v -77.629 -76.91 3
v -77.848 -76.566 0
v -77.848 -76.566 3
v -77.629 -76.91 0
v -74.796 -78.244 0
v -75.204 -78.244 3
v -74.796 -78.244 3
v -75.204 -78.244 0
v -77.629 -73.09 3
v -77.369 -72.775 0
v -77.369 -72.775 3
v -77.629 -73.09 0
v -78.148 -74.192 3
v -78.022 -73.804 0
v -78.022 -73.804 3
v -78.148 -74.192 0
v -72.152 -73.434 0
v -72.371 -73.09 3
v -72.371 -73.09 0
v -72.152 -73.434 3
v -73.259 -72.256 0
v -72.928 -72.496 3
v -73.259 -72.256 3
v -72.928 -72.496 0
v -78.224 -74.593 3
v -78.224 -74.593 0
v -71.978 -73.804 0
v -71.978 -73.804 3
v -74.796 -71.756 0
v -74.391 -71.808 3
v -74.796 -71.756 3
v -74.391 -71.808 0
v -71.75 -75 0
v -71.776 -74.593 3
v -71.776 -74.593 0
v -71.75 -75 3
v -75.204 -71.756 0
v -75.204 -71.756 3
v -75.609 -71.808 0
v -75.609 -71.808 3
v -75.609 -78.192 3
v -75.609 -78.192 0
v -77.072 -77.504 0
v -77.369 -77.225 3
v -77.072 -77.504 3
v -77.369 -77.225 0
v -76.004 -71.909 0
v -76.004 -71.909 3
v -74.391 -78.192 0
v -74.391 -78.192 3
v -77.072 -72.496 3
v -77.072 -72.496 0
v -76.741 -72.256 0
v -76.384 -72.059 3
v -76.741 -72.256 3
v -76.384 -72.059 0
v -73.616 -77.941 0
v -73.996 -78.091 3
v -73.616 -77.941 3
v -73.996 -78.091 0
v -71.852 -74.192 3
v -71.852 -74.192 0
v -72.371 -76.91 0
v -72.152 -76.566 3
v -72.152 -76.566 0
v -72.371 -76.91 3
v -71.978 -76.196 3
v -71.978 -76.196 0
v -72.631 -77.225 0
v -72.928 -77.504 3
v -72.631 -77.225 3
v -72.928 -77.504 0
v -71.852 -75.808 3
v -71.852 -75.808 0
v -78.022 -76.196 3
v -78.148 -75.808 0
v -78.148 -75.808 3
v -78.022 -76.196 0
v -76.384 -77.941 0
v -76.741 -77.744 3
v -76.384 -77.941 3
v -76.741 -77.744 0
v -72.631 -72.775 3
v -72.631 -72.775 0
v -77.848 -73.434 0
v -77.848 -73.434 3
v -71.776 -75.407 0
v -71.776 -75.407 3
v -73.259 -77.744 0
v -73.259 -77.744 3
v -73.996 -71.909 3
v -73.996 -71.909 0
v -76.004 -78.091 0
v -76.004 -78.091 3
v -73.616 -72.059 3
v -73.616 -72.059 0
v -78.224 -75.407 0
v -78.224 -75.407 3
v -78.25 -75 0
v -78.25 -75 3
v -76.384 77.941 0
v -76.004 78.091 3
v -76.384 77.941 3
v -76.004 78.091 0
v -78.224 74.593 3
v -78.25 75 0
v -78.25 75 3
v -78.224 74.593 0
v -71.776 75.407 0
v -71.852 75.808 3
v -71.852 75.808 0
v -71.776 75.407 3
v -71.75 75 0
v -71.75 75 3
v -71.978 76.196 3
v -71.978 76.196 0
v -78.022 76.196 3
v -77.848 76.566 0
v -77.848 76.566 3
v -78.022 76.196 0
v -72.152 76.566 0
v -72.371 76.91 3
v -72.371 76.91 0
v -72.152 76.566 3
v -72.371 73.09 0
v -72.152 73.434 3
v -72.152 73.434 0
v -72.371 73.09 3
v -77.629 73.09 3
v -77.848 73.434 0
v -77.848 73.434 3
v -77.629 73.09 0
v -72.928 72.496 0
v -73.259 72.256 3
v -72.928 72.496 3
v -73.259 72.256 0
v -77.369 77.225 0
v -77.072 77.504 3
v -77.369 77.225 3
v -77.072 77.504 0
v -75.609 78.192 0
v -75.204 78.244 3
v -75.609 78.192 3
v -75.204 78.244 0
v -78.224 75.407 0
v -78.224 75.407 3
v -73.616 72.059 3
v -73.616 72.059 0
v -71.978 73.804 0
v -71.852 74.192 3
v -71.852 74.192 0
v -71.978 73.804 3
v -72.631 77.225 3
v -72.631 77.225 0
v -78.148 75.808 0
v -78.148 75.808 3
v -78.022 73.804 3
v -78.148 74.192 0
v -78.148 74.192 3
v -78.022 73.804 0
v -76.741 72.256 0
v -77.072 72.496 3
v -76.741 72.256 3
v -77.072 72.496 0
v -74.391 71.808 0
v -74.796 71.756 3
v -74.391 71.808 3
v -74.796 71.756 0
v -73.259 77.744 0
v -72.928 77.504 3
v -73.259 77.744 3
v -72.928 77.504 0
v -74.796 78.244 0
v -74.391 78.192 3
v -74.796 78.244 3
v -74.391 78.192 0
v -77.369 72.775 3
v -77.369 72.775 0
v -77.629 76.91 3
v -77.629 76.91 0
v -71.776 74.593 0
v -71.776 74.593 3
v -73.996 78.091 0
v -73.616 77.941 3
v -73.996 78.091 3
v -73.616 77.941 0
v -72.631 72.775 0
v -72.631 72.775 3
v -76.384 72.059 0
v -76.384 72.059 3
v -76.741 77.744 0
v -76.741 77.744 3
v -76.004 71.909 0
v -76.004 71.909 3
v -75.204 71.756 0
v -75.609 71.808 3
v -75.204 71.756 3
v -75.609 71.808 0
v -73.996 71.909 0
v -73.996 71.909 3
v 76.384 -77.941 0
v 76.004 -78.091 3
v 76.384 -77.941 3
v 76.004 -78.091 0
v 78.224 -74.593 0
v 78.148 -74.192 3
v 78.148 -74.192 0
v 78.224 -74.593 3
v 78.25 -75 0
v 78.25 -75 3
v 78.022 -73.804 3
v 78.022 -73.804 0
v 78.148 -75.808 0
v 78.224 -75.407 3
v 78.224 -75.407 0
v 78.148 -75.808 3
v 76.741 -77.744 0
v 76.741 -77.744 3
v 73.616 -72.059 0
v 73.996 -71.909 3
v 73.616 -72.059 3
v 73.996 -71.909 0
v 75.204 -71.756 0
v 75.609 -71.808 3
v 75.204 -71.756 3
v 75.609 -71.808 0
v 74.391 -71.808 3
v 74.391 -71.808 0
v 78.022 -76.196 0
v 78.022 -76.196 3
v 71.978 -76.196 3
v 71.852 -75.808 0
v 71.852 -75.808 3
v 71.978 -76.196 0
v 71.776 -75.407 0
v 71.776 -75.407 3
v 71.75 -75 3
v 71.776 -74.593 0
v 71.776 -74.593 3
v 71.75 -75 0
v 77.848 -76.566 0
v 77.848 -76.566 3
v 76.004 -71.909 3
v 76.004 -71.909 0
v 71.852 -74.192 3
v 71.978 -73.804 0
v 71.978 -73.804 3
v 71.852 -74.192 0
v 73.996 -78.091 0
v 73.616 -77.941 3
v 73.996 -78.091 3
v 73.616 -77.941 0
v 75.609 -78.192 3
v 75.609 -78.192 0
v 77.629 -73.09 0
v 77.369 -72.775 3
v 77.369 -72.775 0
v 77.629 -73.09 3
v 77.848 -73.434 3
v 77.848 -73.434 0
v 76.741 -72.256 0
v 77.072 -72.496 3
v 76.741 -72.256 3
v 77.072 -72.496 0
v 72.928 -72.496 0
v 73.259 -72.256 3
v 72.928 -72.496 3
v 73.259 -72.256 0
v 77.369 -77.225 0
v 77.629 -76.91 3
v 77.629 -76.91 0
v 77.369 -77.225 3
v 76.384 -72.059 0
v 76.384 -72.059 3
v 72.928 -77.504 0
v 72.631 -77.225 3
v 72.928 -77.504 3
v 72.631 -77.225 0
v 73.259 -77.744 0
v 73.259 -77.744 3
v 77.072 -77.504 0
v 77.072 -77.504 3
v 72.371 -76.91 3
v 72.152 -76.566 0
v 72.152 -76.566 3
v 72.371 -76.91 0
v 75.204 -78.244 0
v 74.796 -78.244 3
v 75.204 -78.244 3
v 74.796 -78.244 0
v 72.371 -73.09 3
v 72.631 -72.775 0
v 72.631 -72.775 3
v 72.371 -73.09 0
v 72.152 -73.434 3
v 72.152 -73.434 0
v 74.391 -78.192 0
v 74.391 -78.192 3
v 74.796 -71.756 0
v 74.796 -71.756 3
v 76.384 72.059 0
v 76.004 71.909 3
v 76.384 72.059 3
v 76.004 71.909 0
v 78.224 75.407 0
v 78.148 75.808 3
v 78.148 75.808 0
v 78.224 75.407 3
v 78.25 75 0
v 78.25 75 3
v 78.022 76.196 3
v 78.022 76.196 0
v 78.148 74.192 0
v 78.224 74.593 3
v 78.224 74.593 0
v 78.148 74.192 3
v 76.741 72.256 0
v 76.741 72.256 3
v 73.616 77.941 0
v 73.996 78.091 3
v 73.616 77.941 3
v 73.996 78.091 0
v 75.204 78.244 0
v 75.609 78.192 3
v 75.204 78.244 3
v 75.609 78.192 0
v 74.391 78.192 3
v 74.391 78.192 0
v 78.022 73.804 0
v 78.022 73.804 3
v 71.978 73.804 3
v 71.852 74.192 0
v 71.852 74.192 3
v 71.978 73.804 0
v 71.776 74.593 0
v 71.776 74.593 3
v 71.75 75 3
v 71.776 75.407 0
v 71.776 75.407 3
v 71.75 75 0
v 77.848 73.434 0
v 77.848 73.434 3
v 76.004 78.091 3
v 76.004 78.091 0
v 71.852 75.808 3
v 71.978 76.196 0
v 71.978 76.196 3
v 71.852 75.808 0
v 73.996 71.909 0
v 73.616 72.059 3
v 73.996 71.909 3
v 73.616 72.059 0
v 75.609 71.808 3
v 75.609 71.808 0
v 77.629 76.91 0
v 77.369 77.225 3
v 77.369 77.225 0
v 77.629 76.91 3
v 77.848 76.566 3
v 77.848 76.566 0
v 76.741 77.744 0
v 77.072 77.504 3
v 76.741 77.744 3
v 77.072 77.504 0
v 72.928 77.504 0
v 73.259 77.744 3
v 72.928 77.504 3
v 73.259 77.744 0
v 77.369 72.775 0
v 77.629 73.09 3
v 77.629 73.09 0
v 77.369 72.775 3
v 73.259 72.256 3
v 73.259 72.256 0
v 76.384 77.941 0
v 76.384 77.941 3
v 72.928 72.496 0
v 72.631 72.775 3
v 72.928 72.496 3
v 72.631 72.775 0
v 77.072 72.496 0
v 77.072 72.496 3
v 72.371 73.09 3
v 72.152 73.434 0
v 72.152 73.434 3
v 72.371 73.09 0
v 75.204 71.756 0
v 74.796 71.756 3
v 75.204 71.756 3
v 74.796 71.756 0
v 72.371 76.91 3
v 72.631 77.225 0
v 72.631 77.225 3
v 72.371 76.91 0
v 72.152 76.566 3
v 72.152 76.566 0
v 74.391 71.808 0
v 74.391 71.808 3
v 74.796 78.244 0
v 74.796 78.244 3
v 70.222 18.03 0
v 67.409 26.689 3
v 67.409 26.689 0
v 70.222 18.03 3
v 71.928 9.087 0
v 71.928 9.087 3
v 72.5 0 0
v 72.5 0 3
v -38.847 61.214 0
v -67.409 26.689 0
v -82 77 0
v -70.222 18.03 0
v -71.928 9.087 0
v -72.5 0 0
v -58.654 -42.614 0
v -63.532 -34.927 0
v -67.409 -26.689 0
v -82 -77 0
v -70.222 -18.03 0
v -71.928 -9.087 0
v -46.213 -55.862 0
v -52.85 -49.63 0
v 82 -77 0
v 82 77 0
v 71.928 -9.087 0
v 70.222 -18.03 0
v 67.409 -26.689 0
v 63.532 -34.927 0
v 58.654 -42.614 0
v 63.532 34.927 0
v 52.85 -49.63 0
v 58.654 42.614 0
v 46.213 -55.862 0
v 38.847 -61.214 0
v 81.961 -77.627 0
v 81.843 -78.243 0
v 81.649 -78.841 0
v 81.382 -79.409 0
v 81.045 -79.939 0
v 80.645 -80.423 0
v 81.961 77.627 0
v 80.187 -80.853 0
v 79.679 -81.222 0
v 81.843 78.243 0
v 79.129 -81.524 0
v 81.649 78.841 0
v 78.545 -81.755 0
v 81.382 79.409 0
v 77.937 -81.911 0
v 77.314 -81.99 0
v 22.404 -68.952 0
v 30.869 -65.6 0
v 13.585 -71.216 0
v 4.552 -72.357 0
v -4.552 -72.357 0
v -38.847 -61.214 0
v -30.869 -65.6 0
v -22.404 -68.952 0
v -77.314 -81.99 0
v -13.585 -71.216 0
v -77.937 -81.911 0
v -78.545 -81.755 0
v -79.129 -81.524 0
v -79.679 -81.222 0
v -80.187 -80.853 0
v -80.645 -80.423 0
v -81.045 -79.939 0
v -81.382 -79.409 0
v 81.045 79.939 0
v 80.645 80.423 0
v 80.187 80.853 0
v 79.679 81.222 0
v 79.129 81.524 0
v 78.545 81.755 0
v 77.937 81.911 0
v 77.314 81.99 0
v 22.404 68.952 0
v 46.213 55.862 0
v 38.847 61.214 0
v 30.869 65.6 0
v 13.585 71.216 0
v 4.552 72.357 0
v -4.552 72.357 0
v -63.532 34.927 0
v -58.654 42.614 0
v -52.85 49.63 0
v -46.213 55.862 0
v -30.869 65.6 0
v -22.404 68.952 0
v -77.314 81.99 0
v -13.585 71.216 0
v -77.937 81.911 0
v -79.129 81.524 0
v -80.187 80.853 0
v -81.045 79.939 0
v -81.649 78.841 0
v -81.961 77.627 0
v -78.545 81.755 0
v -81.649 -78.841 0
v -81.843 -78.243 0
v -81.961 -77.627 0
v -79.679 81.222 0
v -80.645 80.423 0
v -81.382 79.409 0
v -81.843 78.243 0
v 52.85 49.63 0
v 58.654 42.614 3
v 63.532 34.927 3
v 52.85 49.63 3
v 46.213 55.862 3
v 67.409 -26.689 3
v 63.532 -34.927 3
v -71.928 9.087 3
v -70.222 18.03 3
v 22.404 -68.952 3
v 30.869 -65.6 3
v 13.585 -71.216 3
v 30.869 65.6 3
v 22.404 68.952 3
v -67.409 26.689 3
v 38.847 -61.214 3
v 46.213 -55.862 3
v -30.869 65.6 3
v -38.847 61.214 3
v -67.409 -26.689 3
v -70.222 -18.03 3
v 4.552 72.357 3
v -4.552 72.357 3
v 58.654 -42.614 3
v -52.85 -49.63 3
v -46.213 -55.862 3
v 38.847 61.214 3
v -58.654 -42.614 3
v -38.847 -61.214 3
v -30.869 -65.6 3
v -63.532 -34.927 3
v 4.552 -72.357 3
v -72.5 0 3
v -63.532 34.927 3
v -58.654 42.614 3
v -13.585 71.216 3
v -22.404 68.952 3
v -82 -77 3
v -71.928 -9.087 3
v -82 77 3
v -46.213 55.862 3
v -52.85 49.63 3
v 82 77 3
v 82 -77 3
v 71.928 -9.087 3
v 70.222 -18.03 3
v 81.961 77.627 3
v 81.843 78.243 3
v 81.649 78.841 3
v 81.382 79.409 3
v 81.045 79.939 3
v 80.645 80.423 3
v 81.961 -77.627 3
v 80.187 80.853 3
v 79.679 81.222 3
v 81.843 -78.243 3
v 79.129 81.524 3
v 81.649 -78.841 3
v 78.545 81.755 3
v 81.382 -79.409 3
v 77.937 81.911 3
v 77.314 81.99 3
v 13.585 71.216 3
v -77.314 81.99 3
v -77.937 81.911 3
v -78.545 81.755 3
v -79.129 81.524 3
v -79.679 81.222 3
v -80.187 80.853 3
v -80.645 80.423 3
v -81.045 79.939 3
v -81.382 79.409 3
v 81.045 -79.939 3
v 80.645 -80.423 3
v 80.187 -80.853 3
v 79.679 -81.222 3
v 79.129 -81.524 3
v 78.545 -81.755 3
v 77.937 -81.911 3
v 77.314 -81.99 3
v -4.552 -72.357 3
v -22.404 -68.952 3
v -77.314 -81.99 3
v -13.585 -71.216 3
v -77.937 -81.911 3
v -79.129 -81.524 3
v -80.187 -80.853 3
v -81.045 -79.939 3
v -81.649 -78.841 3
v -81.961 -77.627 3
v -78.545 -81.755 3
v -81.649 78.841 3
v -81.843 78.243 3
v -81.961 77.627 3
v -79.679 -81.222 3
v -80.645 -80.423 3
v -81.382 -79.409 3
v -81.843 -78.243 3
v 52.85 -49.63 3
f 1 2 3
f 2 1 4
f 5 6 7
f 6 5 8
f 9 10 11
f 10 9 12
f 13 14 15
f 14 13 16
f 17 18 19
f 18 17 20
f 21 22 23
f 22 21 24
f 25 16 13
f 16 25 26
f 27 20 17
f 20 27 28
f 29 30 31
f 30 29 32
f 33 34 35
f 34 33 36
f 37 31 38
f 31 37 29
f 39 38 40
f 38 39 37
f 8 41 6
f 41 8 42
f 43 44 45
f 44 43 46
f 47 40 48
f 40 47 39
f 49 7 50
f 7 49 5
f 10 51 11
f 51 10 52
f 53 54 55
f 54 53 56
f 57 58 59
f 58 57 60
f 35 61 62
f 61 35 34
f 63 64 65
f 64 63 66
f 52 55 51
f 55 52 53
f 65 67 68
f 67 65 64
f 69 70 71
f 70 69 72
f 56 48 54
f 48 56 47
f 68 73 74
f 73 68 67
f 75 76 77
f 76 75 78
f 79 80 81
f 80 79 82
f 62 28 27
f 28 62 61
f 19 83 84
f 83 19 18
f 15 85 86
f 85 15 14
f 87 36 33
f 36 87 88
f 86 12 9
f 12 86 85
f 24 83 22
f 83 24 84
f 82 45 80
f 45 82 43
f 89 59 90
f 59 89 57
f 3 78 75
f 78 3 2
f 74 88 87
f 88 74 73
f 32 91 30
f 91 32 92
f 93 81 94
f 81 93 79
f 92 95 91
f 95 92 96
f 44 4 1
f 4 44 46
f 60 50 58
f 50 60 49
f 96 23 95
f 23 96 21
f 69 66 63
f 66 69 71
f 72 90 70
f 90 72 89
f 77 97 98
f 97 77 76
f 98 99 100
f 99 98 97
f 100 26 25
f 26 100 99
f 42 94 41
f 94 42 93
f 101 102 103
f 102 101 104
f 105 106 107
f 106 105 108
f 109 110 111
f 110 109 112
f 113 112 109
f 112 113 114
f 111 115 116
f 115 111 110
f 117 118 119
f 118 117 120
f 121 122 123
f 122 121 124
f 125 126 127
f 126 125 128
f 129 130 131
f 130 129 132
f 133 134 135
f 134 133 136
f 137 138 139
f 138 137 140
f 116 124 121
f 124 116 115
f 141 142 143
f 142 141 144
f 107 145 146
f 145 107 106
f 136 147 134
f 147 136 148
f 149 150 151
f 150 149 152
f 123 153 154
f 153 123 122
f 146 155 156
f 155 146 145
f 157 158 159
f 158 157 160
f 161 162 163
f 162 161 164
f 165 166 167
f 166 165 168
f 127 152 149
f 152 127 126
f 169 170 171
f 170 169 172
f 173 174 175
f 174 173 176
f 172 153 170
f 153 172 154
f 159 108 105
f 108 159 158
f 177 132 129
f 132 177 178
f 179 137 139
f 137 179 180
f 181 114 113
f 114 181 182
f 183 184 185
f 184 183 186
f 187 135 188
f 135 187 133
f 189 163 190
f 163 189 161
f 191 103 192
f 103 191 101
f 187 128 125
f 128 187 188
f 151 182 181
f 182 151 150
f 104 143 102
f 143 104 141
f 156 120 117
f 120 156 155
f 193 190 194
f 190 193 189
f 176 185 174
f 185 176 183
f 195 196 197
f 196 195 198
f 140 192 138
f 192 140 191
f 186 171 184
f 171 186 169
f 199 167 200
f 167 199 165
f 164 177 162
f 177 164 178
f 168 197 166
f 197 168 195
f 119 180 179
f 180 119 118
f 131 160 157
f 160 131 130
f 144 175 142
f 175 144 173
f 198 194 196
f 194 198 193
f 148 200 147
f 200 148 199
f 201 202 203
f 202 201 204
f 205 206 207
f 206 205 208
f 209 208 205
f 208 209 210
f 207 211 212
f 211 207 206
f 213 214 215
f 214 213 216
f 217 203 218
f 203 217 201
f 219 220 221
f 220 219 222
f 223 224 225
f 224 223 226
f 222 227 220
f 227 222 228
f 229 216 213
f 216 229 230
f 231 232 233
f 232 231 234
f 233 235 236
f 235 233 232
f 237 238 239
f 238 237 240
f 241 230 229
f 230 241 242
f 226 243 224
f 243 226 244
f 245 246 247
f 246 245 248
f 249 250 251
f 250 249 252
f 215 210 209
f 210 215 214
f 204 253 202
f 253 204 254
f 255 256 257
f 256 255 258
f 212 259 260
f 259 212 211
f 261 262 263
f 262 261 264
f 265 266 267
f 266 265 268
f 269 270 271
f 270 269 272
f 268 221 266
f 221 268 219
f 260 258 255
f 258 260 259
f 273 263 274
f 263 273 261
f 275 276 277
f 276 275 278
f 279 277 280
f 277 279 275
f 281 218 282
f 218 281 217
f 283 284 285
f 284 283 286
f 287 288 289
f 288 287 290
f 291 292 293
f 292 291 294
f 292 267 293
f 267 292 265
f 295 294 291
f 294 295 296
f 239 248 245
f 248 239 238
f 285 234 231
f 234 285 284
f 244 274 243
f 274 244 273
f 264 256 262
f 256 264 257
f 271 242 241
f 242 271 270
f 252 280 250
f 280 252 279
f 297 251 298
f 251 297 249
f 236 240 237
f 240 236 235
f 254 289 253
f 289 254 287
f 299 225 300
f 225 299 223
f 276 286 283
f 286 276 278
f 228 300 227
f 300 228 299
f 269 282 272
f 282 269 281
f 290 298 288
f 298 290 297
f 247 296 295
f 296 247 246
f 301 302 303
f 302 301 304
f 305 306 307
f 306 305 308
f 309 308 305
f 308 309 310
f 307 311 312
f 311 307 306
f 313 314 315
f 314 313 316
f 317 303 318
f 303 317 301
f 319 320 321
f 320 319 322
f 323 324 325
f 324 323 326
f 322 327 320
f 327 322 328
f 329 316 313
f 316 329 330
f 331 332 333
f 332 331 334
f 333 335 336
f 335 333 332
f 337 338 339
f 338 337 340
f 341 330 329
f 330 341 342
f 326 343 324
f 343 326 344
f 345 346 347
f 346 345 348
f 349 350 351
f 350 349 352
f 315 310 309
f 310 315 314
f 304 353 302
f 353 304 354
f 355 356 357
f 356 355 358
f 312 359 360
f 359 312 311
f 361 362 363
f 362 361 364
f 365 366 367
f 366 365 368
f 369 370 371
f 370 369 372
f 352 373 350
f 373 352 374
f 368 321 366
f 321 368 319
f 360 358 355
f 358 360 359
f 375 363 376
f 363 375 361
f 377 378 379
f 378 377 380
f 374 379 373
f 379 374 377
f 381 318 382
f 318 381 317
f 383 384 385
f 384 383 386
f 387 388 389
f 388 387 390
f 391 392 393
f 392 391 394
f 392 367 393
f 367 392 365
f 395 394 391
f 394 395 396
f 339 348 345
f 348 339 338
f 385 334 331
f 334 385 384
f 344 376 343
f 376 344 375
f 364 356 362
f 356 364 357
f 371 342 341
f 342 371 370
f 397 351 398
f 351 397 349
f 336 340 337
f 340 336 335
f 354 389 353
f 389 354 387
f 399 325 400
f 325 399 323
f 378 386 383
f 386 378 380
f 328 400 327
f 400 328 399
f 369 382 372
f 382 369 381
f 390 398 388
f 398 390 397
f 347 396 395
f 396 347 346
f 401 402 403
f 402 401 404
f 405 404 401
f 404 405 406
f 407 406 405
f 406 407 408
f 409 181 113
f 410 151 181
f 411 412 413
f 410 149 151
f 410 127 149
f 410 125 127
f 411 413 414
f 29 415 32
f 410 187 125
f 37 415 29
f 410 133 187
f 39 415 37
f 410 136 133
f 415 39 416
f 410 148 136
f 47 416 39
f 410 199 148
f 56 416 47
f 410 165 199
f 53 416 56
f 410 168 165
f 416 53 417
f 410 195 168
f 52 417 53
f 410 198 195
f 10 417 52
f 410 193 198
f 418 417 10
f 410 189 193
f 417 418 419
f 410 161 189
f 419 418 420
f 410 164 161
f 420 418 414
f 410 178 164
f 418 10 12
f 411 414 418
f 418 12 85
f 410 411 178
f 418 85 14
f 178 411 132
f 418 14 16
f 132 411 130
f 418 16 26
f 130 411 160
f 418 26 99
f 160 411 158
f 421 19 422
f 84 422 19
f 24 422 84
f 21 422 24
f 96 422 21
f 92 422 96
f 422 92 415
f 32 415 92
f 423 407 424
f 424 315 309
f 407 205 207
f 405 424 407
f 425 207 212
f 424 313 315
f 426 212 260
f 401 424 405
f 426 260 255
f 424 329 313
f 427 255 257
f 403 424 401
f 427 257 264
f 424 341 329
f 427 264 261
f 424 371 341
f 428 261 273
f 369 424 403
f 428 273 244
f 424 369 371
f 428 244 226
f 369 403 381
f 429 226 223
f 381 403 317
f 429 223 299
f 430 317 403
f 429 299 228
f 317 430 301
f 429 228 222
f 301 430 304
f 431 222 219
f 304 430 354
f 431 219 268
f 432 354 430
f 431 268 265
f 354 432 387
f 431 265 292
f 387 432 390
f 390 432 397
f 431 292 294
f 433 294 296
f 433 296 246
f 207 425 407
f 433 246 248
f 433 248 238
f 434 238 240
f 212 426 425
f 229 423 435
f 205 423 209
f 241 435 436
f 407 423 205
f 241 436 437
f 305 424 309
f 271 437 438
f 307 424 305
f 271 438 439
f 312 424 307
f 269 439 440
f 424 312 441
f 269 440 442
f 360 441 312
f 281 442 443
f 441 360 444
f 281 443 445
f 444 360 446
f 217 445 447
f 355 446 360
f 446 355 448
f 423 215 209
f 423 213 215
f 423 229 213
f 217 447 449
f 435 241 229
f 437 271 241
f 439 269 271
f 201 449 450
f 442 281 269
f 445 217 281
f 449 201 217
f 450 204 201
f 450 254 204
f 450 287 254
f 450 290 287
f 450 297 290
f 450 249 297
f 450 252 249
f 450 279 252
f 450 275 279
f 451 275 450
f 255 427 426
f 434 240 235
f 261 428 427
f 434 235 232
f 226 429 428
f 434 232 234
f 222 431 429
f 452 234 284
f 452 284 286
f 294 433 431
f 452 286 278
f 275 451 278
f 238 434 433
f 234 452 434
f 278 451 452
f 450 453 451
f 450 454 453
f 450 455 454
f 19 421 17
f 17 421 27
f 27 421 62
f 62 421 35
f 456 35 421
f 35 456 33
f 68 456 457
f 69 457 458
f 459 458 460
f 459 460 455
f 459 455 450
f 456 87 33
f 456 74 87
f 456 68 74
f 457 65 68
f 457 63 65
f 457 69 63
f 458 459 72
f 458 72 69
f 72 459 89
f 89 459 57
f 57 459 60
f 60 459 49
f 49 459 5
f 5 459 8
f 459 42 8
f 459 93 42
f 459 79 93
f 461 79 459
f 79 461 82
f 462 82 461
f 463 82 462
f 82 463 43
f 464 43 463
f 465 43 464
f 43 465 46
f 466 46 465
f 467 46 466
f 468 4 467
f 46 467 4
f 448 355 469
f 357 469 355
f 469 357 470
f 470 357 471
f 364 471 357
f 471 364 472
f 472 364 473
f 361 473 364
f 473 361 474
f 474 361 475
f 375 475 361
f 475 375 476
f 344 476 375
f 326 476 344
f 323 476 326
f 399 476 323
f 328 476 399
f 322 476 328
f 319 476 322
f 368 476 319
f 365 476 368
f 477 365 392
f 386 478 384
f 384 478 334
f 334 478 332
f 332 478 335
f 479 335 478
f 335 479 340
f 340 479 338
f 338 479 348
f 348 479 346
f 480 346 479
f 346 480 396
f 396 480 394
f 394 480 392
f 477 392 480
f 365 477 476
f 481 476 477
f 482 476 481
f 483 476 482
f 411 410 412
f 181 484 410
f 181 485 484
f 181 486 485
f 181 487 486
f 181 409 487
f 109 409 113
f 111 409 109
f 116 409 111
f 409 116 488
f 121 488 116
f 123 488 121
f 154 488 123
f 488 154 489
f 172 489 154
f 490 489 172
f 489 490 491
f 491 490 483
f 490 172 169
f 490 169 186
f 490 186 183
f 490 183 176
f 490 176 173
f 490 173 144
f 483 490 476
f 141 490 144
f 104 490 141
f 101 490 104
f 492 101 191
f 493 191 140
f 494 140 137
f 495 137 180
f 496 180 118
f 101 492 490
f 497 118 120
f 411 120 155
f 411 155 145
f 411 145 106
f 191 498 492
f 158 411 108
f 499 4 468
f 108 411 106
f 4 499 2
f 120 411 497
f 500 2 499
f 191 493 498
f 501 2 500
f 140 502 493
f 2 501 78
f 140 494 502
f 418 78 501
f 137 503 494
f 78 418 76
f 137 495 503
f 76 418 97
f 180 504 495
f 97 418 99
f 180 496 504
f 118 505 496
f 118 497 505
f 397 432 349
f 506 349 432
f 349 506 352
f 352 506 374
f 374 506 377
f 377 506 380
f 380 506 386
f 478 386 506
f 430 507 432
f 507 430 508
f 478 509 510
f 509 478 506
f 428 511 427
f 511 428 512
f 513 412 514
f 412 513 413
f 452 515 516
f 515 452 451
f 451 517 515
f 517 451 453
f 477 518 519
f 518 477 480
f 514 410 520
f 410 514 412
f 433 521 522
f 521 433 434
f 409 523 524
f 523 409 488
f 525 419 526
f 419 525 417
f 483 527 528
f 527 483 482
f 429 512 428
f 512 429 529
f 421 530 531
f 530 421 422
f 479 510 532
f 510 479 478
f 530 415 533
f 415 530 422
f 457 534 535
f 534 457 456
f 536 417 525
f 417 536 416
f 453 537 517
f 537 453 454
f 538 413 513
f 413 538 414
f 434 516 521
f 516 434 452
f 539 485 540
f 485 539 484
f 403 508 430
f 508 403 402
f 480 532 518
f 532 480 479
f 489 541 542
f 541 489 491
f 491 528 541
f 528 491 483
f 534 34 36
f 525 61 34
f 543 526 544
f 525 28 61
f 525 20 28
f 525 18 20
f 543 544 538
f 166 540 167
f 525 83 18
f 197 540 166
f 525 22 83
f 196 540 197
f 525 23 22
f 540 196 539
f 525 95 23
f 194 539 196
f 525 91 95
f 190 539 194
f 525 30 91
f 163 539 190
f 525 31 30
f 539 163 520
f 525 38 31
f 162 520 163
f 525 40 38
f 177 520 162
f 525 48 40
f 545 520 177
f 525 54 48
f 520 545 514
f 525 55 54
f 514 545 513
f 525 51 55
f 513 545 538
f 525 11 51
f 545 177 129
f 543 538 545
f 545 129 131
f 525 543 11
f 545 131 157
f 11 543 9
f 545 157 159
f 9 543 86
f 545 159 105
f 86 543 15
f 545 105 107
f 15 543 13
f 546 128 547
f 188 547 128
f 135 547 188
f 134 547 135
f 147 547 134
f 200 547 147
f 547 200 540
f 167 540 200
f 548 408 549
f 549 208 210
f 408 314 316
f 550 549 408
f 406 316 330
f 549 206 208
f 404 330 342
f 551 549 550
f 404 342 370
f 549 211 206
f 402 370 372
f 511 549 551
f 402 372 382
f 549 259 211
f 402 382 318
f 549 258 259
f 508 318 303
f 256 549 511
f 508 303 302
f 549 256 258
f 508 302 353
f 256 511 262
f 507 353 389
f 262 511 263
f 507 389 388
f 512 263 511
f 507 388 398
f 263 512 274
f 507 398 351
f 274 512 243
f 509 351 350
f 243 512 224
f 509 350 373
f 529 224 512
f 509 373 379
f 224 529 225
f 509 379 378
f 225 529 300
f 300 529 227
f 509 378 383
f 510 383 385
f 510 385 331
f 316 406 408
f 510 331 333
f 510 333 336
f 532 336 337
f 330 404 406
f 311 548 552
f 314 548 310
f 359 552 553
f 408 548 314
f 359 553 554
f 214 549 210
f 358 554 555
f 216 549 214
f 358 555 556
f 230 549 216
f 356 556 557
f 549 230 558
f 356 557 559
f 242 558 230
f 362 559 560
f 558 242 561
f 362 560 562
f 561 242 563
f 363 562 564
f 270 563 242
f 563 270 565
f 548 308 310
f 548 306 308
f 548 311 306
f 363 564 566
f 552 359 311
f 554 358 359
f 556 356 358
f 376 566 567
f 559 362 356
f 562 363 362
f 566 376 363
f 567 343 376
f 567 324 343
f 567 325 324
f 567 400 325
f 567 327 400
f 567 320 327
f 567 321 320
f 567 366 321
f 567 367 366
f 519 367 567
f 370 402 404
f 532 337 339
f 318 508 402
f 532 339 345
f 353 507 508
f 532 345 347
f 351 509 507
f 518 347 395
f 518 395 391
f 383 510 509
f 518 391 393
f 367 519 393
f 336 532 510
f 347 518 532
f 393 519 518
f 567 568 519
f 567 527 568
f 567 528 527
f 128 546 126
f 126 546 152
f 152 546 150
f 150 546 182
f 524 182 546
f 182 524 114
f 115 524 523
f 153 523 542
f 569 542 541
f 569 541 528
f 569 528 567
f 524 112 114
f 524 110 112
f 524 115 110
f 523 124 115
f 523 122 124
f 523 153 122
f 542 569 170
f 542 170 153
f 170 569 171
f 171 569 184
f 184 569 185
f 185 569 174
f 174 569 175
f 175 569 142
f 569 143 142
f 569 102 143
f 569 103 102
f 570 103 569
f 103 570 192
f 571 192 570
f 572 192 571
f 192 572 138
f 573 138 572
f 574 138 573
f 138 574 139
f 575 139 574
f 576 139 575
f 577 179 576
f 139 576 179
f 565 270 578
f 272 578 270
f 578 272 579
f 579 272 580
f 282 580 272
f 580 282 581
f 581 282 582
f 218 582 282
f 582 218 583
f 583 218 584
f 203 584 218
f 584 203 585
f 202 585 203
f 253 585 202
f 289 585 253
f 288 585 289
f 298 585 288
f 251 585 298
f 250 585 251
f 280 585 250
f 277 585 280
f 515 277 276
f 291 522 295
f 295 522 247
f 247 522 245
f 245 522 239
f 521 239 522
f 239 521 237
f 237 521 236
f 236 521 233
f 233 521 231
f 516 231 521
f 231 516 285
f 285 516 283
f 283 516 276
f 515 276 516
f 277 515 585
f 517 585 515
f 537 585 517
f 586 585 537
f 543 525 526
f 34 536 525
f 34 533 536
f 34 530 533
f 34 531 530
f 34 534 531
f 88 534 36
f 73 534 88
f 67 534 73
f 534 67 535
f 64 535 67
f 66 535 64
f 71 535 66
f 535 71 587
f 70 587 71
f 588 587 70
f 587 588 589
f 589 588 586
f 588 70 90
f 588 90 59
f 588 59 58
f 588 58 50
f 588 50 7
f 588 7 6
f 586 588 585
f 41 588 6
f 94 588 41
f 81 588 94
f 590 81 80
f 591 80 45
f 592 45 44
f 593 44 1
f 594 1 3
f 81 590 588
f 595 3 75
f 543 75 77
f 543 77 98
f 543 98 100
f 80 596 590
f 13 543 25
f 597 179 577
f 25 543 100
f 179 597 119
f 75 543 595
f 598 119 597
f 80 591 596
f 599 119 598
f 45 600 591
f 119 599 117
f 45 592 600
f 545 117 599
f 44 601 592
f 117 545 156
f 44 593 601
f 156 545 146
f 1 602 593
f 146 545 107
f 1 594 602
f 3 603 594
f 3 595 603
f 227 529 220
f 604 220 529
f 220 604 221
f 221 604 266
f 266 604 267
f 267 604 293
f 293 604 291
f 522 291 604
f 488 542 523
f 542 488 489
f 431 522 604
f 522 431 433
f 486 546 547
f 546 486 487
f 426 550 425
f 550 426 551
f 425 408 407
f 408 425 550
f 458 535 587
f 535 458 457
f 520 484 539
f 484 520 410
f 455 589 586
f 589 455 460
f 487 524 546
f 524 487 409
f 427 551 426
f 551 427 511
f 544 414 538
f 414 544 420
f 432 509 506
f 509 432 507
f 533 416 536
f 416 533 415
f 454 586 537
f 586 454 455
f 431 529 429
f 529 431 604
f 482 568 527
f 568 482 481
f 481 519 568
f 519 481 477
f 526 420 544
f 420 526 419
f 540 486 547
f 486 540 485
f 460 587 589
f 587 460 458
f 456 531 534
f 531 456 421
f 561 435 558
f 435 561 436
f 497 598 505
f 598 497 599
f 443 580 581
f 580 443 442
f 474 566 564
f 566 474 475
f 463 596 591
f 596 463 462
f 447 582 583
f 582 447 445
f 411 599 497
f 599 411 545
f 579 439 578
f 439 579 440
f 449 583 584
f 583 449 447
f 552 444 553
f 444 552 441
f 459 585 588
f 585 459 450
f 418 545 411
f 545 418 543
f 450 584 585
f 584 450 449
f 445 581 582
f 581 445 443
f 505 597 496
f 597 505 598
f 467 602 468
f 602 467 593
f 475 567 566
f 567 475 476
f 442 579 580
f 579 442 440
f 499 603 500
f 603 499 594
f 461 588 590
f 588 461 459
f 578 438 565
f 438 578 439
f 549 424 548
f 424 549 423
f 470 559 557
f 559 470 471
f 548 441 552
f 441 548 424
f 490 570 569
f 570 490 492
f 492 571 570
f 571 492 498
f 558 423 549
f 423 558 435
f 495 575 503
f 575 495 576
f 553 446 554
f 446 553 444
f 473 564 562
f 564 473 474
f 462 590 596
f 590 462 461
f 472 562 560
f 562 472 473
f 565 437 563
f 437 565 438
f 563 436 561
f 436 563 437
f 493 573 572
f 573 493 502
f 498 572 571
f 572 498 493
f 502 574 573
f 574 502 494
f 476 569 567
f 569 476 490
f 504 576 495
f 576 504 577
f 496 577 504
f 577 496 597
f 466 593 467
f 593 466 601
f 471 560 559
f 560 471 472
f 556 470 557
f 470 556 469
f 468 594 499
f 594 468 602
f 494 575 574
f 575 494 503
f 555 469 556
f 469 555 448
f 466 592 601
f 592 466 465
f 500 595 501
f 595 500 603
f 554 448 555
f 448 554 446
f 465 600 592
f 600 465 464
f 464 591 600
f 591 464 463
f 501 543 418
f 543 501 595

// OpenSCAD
$fn = 50;


difference() {
	union() {
		hull() {
			translate(v = [-77.0000000000, 77.0000000000, 0]) {
				cylinder(h = 3, r = 5);
			}
			translate(v = [77.0000000000, 77.0000000000, 0]) {
				cylinder(h = 3, r = 5);
			}
			translate(v = [-77.0000000000, -77.0000000000, 0]) {
				cylinder(h = 3, r = 5);
			}
			translate(v = [77.0000000000, -77.0000000000, 0]) {
				cylinder(h = 3, r = 5);
			}
		}
	}
	union() {
		#translate(v = [-75.0000000000, -75.0000000000, -100.0000000000]) {
			cylinder(h = 200, r = 3.2500000000);
		}
		#translate(v = [-75.0000000000, 75.0000000000, -100.0000000000]) {
			cylinder(h = 200, r = 3.2500000000);
		}
		#translate(v = [75.0000000000, -75.0000000000, -100.0000000000]) {
			cylinder(h = 200, r = 3.2500000000);
		}
		#translate(v = [75.0000000000, 75.0000000000, -100.0000000000]) {
			cylinder(h = 200, r = 3.2500000000);
		}
		#cylinder(h = 3, r = 72.5000000000);
	}
}
